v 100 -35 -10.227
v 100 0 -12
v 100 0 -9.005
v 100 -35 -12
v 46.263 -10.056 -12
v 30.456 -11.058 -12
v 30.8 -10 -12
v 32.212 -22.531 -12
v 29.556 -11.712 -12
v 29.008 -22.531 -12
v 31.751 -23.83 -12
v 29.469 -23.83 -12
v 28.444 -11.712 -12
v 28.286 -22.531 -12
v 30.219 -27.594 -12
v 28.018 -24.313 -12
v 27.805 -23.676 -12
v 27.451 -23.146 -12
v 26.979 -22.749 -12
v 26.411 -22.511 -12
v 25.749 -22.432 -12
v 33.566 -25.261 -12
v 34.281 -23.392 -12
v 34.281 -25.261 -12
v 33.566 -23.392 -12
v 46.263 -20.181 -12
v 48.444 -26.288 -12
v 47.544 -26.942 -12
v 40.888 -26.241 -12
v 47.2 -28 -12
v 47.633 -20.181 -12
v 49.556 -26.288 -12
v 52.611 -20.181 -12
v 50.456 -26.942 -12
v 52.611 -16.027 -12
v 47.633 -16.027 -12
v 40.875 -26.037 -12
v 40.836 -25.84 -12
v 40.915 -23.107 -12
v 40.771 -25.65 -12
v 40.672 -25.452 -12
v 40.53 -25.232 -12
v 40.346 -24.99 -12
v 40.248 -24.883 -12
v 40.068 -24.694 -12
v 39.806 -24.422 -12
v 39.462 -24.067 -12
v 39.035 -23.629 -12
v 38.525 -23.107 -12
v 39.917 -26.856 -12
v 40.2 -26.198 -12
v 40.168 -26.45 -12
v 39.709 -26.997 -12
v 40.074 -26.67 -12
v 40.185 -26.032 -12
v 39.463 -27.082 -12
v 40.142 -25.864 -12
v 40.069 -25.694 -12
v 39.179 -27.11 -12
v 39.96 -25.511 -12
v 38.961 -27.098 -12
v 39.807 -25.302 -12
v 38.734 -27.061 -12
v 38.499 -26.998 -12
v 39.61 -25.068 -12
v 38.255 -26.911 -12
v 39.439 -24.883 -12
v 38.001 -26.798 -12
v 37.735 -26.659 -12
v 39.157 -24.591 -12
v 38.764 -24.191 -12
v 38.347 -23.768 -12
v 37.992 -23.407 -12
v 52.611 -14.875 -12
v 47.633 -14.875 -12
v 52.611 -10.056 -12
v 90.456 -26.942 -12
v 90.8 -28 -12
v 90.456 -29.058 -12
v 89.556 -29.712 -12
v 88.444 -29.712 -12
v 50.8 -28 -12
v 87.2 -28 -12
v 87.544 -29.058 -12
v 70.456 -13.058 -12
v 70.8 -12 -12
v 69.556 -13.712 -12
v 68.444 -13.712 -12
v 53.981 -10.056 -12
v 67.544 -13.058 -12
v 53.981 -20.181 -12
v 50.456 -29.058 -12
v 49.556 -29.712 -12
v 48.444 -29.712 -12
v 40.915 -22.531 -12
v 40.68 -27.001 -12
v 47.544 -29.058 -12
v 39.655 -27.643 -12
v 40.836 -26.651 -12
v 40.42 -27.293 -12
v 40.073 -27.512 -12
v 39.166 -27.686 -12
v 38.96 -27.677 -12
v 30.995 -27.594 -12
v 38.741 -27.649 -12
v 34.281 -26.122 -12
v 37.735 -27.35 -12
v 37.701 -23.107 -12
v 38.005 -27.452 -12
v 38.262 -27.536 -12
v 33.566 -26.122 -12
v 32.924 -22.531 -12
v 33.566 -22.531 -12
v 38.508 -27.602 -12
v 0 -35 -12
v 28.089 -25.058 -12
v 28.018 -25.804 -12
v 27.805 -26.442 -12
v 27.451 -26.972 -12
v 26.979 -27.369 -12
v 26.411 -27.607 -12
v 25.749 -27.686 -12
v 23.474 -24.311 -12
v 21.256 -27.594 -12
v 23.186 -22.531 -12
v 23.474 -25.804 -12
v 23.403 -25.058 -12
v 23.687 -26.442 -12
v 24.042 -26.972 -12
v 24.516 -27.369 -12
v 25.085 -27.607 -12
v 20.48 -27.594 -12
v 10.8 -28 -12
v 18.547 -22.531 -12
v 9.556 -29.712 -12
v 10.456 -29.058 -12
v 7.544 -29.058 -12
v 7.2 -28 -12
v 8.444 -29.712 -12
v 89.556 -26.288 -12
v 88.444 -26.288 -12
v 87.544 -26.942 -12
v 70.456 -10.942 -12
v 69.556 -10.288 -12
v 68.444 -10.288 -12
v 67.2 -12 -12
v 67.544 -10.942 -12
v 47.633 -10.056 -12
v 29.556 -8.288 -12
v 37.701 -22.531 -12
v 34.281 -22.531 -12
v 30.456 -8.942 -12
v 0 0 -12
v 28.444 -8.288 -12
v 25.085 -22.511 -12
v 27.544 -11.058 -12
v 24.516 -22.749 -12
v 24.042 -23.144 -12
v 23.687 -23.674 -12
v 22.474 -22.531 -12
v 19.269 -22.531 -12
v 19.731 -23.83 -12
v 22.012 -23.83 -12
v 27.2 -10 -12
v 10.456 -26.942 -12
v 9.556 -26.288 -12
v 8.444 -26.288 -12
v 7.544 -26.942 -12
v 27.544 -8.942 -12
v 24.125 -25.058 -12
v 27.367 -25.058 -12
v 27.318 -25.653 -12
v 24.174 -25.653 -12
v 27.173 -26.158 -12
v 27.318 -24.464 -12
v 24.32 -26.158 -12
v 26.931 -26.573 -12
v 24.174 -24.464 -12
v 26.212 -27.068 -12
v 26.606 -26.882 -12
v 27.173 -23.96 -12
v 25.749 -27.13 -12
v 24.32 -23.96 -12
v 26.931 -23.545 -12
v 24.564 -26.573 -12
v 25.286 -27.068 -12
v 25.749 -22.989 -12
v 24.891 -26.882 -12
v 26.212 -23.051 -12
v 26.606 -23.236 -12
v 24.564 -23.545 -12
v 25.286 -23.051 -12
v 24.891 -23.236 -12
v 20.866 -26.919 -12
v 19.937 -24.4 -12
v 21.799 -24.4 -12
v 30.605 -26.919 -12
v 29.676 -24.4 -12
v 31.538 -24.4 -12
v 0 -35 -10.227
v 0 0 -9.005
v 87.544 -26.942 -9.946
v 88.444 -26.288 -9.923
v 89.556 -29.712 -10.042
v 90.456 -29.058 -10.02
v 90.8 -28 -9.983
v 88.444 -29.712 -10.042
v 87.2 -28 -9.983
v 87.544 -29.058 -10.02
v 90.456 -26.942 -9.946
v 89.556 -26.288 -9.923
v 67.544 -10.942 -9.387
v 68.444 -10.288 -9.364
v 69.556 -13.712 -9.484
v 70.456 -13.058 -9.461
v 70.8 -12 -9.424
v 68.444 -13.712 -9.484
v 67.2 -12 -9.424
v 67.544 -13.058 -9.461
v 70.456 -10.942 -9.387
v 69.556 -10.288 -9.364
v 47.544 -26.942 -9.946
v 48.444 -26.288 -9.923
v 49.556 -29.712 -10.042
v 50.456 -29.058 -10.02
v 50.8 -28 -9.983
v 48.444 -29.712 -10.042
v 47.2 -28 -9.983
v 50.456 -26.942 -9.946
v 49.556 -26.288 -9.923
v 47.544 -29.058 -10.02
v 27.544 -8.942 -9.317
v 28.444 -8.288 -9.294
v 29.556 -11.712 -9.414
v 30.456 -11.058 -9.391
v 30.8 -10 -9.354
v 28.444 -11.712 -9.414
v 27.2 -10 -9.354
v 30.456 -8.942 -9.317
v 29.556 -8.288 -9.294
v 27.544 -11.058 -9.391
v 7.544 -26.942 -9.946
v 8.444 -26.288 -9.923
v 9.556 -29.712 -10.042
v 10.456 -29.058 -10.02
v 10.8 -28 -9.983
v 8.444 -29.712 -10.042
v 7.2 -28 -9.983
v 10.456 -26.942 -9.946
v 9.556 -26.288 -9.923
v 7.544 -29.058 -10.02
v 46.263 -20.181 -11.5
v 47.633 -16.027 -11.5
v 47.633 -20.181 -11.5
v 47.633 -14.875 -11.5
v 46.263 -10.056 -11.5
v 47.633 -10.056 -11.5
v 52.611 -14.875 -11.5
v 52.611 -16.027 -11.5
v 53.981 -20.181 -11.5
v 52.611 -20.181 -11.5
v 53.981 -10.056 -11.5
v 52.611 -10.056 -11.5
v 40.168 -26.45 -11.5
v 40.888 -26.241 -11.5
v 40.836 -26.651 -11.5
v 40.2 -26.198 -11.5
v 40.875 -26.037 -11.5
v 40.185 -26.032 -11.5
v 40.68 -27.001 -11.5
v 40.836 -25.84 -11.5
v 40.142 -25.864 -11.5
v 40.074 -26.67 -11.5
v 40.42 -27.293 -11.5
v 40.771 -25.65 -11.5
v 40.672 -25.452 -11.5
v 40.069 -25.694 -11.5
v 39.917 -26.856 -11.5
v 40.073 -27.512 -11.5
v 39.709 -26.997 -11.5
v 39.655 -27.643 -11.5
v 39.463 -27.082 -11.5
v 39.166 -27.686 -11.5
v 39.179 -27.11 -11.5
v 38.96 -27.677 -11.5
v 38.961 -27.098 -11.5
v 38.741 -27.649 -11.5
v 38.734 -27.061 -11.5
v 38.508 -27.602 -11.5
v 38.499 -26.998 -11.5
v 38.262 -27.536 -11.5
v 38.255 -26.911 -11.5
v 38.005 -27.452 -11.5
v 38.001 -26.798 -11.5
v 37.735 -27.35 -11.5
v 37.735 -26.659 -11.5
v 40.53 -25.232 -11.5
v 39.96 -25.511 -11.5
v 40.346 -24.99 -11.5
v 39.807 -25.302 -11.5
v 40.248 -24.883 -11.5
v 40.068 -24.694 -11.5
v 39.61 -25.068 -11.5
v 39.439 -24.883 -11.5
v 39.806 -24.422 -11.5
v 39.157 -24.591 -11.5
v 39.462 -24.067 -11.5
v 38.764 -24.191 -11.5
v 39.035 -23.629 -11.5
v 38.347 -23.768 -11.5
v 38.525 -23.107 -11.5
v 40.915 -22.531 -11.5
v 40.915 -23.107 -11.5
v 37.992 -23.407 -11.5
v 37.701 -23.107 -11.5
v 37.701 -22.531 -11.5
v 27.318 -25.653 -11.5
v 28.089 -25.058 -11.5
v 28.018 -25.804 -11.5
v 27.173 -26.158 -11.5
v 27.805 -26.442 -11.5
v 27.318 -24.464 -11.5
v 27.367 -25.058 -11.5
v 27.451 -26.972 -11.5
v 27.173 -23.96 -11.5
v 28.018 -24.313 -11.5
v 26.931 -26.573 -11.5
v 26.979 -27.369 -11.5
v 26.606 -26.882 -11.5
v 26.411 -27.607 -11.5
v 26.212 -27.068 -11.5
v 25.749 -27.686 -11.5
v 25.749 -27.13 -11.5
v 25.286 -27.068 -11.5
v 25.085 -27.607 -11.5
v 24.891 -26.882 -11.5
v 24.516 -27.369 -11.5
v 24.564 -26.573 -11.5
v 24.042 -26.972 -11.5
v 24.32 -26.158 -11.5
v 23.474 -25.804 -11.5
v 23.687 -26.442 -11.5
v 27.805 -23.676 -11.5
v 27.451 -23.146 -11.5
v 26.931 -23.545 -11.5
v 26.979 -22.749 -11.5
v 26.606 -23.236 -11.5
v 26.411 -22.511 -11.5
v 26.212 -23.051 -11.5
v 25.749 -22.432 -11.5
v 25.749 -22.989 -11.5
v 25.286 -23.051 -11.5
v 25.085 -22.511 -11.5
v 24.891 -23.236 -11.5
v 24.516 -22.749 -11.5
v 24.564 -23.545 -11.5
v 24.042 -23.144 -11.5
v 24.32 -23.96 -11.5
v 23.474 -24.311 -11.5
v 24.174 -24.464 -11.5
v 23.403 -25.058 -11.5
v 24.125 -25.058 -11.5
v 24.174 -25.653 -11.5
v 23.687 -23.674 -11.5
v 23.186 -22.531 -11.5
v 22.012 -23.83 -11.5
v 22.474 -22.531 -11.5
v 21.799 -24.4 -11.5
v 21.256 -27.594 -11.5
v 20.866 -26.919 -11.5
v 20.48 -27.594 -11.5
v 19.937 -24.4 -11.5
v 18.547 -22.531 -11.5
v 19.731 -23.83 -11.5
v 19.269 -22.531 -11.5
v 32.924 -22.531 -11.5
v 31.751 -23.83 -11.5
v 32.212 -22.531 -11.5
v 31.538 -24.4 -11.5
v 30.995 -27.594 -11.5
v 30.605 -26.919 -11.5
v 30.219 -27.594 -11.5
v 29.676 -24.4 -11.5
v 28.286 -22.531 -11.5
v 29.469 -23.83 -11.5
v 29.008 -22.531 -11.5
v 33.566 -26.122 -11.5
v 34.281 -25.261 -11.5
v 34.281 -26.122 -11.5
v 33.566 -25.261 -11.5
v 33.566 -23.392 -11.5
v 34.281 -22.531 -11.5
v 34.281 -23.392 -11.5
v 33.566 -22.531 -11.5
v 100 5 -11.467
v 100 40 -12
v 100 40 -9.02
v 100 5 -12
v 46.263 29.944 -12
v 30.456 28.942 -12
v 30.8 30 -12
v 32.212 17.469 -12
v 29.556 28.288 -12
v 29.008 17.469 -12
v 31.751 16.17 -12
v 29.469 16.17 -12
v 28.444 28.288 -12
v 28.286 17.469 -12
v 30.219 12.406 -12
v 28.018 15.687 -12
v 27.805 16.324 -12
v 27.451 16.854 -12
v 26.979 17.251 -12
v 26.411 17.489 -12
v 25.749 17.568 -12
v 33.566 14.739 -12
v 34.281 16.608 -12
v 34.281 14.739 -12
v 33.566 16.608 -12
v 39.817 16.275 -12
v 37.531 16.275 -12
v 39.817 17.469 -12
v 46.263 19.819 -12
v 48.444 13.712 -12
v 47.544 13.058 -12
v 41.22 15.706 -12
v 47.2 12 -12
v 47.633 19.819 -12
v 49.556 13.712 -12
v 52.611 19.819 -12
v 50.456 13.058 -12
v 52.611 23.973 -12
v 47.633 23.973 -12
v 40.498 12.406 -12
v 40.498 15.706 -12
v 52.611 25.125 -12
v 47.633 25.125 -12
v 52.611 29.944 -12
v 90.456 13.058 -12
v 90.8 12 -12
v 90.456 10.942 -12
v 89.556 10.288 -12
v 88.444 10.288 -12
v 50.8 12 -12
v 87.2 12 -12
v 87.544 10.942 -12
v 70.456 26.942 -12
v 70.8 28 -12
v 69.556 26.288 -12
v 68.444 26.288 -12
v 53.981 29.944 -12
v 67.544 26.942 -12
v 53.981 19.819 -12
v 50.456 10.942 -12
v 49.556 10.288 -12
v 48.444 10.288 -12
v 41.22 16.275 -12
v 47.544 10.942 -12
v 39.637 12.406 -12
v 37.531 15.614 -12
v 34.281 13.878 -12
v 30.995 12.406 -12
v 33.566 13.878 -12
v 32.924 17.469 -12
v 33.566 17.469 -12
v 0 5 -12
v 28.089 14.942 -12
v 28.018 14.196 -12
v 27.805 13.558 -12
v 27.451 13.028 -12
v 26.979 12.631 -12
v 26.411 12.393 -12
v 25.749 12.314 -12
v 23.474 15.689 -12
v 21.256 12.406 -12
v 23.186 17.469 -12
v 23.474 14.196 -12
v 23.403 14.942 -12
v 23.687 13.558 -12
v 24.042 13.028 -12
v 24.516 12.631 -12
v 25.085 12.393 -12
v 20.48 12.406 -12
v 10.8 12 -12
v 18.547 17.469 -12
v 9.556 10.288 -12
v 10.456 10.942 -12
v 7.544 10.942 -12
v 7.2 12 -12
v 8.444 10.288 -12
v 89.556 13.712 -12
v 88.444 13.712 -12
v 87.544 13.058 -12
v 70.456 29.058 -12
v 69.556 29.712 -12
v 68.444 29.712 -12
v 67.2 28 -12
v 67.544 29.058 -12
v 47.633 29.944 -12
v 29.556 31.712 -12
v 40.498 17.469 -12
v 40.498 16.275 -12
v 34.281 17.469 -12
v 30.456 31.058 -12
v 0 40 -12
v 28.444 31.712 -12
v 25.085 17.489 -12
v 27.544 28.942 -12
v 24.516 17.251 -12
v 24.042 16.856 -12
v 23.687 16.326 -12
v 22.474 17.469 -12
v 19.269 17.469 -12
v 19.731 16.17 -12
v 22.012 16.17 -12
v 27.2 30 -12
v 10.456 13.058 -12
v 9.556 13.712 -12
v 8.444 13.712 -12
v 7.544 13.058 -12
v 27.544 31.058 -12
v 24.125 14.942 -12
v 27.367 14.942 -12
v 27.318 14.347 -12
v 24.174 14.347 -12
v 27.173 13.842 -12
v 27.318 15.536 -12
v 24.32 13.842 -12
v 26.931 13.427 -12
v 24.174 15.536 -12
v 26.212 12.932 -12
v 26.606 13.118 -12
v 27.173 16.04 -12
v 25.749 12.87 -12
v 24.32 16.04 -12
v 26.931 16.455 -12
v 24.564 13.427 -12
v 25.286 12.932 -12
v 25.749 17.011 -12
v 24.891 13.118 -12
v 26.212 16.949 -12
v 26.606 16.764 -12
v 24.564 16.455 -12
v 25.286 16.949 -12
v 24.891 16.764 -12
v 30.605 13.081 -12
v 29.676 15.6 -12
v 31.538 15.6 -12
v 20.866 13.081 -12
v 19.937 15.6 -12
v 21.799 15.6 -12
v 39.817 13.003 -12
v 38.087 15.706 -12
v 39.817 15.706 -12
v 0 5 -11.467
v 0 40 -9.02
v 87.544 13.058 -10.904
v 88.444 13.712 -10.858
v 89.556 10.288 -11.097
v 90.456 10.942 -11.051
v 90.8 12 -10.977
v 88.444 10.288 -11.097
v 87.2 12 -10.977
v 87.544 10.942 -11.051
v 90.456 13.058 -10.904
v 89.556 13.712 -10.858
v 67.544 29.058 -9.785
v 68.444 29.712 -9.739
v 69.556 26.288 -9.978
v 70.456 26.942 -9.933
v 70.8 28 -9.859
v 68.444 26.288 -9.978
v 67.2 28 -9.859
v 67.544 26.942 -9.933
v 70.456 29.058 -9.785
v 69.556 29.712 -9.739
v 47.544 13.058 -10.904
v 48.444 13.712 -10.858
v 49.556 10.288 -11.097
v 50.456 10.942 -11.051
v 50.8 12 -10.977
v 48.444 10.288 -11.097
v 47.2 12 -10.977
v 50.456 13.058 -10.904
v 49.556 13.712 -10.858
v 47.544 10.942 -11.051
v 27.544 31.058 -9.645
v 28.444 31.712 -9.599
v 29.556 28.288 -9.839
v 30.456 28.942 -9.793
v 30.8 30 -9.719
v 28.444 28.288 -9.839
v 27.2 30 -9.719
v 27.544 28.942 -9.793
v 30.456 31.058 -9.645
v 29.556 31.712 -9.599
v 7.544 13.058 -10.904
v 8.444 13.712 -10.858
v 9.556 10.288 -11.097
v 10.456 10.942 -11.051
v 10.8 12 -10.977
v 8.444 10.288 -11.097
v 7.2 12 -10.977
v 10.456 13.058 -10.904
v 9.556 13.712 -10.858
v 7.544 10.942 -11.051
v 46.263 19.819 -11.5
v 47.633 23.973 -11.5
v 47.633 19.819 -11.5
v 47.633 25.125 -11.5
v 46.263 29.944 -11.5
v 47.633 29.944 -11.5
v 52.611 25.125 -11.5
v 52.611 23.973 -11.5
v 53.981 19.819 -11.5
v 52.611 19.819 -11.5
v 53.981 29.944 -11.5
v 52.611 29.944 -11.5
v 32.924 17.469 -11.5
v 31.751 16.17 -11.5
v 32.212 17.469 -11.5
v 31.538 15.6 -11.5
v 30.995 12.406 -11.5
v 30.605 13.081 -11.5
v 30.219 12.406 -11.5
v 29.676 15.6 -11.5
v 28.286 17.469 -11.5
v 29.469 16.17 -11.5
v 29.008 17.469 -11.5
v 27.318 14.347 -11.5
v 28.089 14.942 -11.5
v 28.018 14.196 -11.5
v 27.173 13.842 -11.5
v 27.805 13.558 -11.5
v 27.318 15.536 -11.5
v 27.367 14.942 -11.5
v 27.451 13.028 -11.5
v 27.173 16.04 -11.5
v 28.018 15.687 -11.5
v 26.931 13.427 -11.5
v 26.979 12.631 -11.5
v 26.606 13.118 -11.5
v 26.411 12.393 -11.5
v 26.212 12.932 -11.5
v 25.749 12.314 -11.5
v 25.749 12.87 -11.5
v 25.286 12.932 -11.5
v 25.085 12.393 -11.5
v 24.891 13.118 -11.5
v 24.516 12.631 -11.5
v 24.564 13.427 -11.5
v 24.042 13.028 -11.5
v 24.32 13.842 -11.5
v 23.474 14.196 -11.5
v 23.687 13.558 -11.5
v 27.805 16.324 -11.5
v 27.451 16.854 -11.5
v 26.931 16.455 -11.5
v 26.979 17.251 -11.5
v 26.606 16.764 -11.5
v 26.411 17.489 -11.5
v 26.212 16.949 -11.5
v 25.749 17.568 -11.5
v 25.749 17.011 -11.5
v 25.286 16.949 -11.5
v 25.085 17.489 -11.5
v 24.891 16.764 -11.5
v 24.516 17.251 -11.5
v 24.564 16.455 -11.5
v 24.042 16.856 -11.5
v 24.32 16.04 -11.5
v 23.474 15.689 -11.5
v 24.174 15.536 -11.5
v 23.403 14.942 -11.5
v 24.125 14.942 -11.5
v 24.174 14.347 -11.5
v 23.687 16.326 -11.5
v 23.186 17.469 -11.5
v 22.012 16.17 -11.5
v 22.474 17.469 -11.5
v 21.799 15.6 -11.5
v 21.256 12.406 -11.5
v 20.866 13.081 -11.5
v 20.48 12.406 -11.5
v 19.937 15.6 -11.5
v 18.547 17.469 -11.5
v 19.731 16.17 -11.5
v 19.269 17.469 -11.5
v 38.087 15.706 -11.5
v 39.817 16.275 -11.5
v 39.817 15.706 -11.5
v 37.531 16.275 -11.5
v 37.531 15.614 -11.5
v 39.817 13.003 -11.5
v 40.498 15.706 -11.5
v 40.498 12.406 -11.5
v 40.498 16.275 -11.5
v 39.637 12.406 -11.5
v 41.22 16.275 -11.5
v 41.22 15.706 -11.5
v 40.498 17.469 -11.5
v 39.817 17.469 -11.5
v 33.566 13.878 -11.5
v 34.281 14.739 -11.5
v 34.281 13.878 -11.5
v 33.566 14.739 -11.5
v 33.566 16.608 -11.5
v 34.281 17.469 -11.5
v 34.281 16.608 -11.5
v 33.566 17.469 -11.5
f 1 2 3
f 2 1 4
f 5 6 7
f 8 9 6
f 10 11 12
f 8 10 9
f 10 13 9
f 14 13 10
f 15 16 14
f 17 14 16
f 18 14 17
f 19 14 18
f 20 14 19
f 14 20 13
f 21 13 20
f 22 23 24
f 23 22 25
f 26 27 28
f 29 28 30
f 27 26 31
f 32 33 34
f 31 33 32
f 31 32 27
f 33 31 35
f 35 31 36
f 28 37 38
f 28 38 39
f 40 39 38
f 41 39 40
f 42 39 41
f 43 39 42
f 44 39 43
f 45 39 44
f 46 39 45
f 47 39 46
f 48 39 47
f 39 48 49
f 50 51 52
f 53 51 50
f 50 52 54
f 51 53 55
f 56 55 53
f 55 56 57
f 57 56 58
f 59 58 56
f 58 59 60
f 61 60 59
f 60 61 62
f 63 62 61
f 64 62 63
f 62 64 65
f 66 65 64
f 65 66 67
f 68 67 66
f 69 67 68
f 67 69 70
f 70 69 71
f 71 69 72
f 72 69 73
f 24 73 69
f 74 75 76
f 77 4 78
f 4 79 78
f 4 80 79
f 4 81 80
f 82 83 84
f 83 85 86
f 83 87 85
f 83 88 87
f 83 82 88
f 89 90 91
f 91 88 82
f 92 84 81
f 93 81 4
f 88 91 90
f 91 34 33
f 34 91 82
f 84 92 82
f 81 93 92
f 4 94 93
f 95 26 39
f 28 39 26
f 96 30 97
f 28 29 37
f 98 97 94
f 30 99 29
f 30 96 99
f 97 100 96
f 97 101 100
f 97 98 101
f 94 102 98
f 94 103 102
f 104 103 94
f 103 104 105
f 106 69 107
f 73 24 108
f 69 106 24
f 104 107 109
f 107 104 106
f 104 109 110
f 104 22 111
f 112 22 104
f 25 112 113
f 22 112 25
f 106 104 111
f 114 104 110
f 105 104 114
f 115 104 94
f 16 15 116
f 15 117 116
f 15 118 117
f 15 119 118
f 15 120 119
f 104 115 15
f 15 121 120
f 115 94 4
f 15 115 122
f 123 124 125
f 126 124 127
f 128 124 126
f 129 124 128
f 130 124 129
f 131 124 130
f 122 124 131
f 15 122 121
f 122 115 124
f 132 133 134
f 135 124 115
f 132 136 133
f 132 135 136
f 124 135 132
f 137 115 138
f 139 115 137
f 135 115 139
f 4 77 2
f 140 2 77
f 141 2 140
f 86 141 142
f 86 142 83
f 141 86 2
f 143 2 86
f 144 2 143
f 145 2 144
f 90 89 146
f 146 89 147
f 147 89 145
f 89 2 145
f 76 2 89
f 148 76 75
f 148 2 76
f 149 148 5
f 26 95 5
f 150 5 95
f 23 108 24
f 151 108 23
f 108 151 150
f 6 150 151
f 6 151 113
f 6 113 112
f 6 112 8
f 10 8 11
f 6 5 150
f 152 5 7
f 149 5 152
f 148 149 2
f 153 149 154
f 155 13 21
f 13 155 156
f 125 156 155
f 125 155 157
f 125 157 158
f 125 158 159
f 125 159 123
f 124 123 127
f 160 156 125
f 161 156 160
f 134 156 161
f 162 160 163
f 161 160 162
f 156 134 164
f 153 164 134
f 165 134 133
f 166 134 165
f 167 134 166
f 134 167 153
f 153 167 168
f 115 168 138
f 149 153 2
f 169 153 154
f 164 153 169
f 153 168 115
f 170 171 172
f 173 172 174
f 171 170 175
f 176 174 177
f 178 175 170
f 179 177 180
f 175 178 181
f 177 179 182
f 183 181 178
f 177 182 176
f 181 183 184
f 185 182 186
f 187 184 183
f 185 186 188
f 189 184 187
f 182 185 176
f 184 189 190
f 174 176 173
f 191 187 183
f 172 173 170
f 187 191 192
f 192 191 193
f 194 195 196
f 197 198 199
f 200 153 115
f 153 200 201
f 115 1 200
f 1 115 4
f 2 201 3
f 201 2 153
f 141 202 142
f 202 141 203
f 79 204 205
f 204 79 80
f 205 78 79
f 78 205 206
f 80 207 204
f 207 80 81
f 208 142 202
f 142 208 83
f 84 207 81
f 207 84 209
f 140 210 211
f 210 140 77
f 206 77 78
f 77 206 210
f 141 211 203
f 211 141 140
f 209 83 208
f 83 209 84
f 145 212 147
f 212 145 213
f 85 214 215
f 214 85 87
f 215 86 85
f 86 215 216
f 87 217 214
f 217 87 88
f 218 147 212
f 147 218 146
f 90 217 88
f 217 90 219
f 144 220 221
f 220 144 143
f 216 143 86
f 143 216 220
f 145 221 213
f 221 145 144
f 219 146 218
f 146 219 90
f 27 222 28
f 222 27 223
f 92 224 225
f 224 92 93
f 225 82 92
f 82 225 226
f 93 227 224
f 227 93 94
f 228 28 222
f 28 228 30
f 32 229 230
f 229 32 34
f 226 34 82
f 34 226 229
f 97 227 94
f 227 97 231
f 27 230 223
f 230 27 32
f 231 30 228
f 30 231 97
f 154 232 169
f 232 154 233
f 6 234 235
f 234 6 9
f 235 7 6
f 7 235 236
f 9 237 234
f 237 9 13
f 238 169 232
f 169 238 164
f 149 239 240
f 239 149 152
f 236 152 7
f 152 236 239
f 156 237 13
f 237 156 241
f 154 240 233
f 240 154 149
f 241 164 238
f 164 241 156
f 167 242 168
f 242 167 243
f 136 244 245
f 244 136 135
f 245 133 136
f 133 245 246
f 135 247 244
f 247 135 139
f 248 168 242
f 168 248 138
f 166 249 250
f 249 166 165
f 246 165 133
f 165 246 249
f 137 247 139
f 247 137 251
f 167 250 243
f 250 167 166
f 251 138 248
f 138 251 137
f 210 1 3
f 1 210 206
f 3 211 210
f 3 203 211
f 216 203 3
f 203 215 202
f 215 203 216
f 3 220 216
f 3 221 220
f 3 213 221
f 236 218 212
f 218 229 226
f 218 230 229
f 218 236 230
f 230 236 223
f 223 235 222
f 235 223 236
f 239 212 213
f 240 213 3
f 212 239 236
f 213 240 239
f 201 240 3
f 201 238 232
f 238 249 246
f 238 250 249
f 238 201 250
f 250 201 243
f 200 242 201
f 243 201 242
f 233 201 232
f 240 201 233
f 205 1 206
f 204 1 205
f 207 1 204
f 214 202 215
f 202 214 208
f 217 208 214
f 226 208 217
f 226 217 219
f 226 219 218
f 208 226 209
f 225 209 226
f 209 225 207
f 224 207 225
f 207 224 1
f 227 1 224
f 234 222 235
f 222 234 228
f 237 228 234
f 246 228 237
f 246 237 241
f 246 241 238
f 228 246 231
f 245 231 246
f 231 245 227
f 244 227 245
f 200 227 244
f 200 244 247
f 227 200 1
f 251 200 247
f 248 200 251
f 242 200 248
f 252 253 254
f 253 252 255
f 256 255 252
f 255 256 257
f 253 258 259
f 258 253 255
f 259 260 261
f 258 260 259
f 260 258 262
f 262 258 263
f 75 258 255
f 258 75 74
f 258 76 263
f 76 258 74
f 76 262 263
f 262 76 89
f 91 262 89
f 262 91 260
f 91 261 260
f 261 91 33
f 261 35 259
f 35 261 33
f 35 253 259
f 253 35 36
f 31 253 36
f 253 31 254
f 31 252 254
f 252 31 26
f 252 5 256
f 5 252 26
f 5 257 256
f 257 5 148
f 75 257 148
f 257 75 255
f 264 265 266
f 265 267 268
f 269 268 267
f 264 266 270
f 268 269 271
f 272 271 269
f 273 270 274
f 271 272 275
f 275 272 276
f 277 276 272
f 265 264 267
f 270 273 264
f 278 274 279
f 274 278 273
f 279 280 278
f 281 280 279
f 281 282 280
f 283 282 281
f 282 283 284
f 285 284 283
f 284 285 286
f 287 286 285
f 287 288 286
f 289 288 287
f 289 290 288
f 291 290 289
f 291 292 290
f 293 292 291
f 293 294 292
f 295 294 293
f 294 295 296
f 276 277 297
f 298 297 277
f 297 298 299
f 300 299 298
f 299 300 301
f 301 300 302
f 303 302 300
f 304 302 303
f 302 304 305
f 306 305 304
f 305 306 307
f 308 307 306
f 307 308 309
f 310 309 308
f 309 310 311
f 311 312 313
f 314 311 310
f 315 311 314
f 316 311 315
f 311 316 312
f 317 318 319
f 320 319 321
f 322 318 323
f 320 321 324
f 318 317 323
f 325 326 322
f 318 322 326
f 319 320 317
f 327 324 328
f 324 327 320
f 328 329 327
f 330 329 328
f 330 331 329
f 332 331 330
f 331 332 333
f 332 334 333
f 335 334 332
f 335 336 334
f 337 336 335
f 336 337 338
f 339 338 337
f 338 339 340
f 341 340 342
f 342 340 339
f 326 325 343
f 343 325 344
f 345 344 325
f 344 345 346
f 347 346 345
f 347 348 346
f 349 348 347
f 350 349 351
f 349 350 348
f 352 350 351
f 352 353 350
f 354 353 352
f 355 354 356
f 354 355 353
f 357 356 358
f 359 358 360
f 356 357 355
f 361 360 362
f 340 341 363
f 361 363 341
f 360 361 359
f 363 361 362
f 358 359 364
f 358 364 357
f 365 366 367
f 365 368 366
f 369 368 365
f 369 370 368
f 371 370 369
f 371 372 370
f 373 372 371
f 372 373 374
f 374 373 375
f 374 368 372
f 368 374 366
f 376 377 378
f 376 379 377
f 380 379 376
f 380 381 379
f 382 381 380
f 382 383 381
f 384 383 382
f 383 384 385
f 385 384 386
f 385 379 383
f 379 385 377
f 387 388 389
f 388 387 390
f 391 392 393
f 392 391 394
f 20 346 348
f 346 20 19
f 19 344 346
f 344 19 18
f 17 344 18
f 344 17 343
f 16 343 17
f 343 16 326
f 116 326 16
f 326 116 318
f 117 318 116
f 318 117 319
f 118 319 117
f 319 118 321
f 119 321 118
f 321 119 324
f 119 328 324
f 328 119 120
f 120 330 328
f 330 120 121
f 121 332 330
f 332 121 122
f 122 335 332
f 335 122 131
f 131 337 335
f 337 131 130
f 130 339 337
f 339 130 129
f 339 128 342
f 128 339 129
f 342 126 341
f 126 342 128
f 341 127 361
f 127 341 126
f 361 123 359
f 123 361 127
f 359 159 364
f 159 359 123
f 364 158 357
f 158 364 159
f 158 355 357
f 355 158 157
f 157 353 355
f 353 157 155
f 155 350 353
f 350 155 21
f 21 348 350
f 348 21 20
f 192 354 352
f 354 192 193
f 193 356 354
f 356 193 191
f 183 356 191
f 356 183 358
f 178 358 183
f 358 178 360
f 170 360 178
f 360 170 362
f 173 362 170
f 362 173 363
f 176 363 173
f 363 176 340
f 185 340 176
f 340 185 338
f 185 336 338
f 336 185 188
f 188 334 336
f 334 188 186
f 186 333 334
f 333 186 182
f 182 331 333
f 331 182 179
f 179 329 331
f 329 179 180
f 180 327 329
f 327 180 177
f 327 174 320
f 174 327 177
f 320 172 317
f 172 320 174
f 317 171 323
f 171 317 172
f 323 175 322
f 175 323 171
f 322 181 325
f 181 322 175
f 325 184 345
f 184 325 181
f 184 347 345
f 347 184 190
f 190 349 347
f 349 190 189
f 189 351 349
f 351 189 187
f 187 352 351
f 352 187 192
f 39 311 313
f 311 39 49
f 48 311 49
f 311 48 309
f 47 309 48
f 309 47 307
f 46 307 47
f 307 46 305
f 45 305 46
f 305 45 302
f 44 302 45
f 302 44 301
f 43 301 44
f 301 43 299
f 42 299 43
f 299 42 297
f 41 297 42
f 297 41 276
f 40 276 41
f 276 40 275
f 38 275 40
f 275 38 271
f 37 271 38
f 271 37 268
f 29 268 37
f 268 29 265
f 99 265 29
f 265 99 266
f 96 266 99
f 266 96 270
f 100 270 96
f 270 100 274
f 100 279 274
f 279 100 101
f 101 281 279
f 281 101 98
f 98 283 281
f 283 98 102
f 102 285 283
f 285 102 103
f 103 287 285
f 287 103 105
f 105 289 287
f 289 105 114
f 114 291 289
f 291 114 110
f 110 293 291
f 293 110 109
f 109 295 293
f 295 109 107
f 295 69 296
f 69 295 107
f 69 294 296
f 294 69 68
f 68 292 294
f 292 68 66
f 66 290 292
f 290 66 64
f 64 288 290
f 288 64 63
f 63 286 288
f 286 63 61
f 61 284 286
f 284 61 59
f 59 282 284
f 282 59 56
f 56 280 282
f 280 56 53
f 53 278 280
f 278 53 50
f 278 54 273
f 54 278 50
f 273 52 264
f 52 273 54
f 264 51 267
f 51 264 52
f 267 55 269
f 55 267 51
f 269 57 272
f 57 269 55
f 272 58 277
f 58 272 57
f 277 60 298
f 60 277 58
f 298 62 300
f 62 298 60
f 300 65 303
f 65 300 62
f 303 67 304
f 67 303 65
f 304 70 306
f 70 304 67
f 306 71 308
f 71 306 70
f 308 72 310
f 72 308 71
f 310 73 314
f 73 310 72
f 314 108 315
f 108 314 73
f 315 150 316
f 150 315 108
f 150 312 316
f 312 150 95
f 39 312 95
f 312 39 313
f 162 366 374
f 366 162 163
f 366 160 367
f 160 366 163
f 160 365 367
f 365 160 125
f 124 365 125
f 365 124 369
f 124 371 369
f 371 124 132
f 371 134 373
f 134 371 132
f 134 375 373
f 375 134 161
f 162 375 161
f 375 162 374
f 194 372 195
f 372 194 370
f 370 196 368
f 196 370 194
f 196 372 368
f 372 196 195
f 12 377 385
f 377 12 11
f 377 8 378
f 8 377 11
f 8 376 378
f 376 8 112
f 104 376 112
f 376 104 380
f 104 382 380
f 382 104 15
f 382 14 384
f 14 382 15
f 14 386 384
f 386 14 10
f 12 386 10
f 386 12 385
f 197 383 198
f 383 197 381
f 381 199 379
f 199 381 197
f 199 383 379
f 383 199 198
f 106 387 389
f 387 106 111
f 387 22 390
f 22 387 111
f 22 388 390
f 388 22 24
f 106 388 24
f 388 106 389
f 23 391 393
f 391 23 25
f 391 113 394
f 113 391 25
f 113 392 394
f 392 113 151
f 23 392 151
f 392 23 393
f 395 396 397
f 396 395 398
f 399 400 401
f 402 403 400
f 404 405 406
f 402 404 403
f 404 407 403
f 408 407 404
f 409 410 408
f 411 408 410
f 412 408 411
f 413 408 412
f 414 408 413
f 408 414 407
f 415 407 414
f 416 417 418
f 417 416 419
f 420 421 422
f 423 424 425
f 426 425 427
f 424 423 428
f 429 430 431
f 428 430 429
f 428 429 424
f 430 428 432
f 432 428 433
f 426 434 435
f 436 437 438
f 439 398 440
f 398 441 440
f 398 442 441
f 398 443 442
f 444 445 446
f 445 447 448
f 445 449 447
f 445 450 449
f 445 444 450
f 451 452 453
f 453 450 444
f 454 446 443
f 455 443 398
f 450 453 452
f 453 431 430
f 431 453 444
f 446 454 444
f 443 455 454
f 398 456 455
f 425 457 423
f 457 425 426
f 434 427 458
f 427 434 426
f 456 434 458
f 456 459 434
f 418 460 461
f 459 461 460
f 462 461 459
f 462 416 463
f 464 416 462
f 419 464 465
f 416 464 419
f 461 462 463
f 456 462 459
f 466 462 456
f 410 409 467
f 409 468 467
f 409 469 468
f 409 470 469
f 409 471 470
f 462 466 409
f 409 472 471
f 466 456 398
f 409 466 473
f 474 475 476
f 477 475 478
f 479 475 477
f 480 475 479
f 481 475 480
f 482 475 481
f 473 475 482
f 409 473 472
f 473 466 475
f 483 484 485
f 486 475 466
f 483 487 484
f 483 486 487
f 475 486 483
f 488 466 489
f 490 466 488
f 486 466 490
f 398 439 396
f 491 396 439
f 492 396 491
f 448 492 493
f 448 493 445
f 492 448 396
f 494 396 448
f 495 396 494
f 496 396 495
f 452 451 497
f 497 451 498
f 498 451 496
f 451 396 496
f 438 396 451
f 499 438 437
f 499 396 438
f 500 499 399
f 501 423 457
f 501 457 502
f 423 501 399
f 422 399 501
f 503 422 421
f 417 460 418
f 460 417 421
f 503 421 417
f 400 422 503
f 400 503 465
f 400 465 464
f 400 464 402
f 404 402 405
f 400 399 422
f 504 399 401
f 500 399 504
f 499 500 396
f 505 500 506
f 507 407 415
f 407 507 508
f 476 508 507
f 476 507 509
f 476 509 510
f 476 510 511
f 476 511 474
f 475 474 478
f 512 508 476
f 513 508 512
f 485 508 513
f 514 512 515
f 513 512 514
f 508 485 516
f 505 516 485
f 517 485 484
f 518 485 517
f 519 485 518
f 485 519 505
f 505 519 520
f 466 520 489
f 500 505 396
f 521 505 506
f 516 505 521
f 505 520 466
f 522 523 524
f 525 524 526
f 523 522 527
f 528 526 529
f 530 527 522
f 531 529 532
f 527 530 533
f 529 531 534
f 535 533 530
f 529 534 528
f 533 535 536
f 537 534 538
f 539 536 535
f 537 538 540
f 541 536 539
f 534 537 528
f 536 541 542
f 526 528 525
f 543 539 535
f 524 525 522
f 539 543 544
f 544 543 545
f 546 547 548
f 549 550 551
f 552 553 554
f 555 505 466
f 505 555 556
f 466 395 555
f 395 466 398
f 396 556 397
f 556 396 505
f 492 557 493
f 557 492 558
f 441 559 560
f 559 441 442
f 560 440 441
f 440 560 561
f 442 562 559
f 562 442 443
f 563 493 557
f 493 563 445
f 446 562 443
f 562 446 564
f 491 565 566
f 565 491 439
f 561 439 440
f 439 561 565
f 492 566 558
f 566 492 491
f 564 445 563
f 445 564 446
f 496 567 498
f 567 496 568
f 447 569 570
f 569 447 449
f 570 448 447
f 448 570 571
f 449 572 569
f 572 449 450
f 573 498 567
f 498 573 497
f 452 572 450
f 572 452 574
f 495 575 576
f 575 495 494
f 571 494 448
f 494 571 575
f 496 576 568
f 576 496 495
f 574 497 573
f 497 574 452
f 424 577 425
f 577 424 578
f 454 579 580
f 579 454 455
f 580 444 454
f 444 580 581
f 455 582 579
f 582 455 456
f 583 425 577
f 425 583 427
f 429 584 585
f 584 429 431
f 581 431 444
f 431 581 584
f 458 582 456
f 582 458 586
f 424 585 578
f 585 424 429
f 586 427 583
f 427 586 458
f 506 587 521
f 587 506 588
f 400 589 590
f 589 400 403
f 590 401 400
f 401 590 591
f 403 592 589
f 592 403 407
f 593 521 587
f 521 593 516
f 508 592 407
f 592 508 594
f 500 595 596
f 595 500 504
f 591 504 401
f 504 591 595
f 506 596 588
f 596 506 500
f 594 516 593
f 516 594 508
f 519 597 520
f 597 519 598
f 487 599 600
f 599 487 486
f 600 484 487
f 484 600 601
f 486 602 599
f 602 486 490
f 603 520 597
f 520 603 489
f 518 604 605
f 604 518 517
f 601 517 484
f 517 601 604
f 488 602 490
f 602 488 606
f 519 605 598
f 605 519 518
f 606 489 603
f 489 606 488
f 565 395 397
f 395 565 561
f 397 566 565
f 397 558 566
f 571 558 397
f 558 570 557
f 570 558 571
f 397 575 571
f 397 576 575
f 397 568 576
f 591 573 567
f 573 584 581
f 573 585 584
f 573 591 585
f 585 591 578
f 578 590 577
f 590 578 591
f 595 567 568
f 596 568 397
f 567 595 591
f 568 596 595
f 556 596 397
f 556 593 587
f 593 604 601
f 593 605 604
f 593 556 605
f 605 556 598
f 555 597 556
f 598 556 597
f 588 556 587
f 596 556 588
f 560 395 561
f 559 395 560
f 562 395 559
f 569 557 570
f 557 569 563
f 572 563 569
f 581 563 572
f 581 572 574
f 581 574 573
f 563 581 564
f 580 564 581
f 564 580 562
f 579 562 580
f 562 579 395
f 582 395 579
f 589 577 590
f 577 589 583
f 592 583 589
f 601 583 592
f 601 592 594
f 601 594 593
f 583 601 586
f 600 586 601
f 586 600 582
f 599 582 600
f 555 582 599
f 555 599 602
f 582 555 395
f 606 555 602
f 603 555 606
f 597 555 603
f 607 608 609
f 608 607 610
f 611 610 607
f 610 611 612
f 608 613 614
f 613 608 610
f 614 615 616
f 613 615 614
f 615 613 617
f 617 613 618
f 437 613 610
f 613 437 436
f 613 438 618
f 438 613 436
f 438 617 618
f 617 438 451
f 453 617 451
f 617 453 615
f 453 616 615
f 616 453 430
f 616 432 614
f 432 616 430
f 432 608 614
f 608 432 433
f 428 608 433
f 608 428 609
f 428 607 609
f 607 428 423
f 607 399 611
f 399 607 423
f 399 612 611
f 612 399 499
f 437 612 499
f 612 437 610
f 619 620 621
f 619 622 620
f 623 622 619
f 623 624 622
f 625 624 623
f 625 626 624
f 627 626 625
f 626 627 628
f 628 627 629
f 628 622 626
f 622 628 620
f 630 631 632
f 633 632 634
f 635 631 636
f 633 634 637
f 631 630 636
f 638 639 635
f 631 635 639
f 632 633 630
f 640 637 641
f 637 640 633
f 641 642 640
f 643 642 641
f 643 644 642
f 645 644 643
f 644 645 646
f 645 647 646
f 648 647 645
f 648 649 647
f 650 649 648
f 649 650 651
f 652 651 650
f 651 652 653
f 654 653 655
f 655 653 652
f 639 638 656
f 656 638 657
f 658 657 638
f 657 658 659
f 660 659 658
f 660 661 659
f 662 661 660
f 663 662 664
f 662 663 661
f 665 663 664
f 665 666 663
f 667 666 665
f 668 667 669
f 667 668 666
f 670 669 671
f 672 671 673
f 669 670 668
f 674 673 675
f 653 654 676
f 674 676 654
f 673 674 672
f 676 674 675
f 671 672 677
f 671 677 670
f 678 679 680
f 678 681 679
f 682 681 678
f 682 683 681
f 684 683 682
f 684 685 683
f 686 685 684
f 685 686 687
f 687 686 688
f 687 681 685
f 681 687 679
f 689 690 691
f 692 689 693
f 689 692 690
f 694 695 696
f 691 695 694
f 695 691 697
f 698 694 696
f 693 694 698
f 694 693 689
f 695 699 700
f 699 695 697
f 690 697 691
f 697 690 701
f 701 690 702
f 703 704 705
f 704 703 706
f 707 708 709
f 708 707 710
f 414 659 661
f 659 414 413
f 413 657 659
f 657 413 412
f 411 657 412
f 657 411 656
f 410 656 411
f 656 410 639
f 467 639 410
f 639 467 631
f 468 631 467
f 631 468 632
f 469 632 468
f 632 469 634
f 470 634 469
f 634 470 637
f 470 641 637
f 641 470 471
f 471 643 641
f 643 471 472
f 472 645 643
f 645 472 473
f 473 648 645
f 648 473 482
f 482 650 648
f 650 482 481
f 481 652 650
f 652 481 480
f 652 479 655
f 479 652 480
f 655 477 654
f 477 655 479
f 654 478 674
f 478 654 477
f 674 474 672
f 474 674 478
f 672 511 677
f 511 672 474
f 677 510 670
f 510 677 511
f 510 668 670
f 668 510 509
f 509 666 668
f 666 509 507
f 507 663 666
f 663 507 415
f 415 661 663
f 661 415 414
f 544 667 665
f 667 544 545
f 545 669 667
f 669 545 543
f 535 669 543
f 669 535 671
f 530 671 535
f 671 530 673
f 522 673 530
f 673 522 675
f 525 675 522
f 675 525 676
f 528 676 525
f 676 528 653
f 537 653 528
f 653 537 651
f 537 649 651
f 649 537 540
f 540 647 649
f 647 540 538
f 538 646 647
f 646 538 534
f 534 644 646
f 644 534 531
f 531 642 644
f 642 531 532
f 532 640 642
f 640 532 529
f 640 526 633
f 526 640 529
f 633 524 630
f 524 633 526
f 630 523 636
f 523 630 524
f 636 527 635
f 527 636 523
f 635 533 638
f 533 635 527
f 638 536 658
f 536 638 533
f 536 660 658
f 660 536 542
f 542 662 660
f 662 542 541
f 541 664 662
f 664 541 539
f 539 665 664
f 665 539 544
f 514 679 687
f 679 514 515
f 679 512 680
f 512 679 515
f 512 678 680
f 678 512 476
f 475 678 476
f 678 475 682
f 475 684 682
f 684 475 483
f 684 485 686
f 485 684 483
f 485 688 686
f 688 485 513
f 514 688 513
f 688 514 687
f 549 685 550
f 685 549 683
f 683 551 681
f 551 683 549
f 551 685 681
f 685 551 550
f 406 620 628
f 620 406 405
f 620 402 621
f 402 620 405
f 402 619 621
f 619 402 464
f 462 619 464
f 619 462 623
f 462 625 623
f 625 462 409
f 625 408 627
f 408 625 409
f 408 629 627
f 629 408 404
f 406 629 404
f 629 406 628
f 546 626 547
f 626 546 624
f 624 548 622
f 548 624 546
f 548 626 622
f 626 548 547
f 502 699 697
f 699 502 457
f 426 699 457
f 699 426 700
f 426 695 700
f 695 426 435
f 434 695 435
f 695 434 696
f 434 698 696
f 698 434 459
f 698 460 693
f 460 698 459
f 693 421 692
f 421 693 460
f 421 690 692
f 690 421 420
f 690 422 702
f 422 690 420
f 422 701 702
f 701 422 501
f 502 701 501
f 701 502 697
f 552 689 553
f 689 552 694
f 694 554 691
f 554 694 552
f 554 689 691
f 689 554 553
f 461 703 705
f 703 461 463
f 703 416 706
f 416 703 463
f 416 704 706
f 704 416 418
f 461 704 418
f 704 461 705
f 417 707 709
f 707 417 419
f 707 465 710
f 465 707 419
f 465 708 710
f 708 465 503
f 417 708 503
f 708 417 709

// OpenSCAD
// file: ../lib/naca4.scad
// Naca4.scad - library for parametric airfoils of 4 digit NACA series
// Code: Rudolf Huttary, Berlin 
// June 2015
// commercial use prohibited


// general use: for more examples refer to sampler.scad
// naca = naca digits or 3el vector  (default = 12 or [0, 0, .12])
// L    = chord length [mm]      (default= 100)
// N    = # sample points        (default= 81)
// h    = height [mm]            (default= 1)
// open = close at the thin end? (default = true)
// two equivalent example calls
 airfoil(naca = 2408, L = 60, N=1001, h = 30, open = false); 
// airfoil(naca = [.2, .4, .32], L = 60, N=1001, h = 30, open = false); 

module help()
{
  echo(str("\n\nList of signatures in lib:\n=================\n", 
  "module airfoil(naca=2412, L = 100, N = 81, h = 1, open = false) - renders airfoil object\n", 
  "module airfoil(naca=[.2, .4, .12], L = 100, N = 81, h = 1, open = false) - renders airfoil object using percentage for camber,  camber distance and thicknes\n", 
  "function airfoil_data(naca=12, L = 100, N = 81, open = false)\n",
  "=================\n")); 
}

help(); 
// this is the object
module airfoil(naca=12, L = 100, N = 81, h = 1, open = false)
{
  linear_extrude(height = h)
  polygon(points = airfoil_data(naca, L, N, open)); 
}

module hollow_airfoil(lnaca=12, L = 100, N = 81, h = 1, open = false, wall_thickness = 1)
{
    if (open){
        linear_extrude(height = h)

        if (wall_thickness>0){
            difference(){
                polygon(points = airfoil_data(naca, L, N, false));
                offset(delta = - wall_thickness, chamfer = false) polygon(points = airfoil_data(naca, L, N, open = false));
            }
        }
        else{
            difference(){
                offset(delta = - wall_thickness, chamfer = false) polygon(points = airfoil_data(naca, L, N, open = false));
                polygon(points = airfoil_data(naca, L, N, false));
            }
        }
    }
    else{

        linear_extrude(height = abs(wall_thickness))
            polygon(points = airfoil_data(naca, L, N, false)); 

        linear_extrude(height = h)
            difference(){
                polygon(points = airfoil_data(naca, L, N, open));
                offset(delta = - wall_thickness) polygon(points = airfoil_data(naca, L, N, open = false));
            }

        translate([0,0, h - wall_thickness])
            linear_extrude(height = abs(wall_thickness))
                polygon(points = airfoil_data(naca, L, N, false)); 

    }
}


// this is the main function providing the airfoil data
function airfoil_data(naca=12, L = 100, N = 81, open = false) = 
  let(Na = len(naca)!=3?NACA(naca):naca)
  let(A = [.2969, -0.126, -.3516, .2843, open?-0.1015:-0.1036])
  [for (b=[-180:360/(N):179.99]) 
    let (x = (1-cos(b))/2)  
    let(yt = sign(b)*Na[2]/.2*(A*[sqrt(x), x, x*x, x*x*x, x*x*x*x])) 
    Na[0]==0?L*[x, yt]:L*camber(x, yt, Na[0], Na[1], sign(b))];  


function trailing_edge_angle(naca=12, open = false) = 
  let(Na = len(naca)!=3?NACA(naca):naca)
  let(A = [.2969, -0.126, -.3516, .2843, open?-0.1015:-0.1036])
  let (x =0.999)  // set x near to airfoil trailing edge
  let(yt = Na[2]/.2*(A*[sqrt(x), x, x*x, x*x*x, x*x*x*x])) // calculate distance from x-axis at previously set position
  atan2(yt,1-x);  // calculate angle of triangle between end of airfoil. The triange height corresponds to previously calculated distance from x-axis

function surface_angle(x = 0.5, naca=12, open = false) = 
  let(Na = len(naca)!=3?NACA(naca):naca)
  let(A = [0.2969, -0.126, -0.3516, 0.2843, open?-0.1015:-0.1036])
  let(dy = Na[2]/0.2*(A*[(1/2)*(1/sqrt(x)), 1, 2*x, 3*x*x, 4*x*x*x])) // calculate derivative of airfoil function at the x point
  atan(dy);  // calculate  the angle from function derivative

function surface_distance(x = 0.5, naca=12, open = false) = 
  let(Na = len(naca)!=3?NACA(naca):naca)
  let(A = [0.2969, -0.126, -0.3516, 0.2843, open?-0.1015:-0.1036])
  Na[2]/.2*(A*[sqrt(x), x, x*x, x*x*x, x*x*x*x]); // calculate distance from x-axis at previously set position

// helper functions
function NACA(naca) = 
  let (M = floor(naca/1000))
  let (P = floor((naca-M*1000)/100)) 
  [M/100, P/10, floor(naca-M*1000-P*100)/100];  

function camber(x, y, M, P, upper) = 
  let(yc = (x<P)?M/P/P*(2*P*x-x*x): M/(1-P)/(1-P)*(1 - 2*P + 2*P*x -x*x))
  let(dy = (x<P)?2*M/P/P*(P-x):2*M/(1-P)/(1-P)*(P-x))
  let(th = atan(dy))
  [upper ? x - y*sin(th):x + y*sin(th), upper ? yc + y*cos(th):yc - y*cos(th)];
// file: ../666_1247.scad
use <./lib/naca4.scad>
include <../Parameters.scad>

AOA = 2.0; // set Angle of Attact of the airfoil

module 666_1247(angle_of_attact){
	union(){
		difference(){
			cube([100,35,12]);

			translate([9+ 20 + 20 + 20 + 20,35-7,-1])
					cylinder (h = 20, r = 3.6/2, $fn = 10);

			translate([9 + 20 + 20 + 20, 35-23, -1])	
					cylinder (h = 20, r = 3.6/2, $fn = 10);

			translate([9 + 20 + 20,35-7,-1])	
					cylinder (h = 20, r = 3.6/2, $fn = 10);

			translate([9 + 20, 35-25, -1])	
					cylinder (h = 20, r = 3.6/2, $fn = 10);

			translate([9,35-7,-1])	
					cylinder (h = 20, r = 3.6/2, $fn = 10);

			translate([-1,0,(12-8)/4])		// set AOA
				rotate([angle_of_attact,0,0])		
					cube([200, 100, 8]);

            translate([50, 15, 11.5])
                            linear_extrude(0.5) 
                                text("H", size = 10, halign = "center", valign = "center", font = "PT Sans");

            translate([30, 25, 11.5])
                            linear_extrude(0.5) 
                                text( str("AOA: ", angle_of_attact), size = 5, halign = "center", valign = "center", font = "PT Sans");

            translate([50, 15, 0])
                            linear_extrude(0.5) 
                                text("D", size = 10, halign = "center", valign = "center", font = "PT Sans");

            translate([30, 25, 0])
                            linear_extrude(0.5) 
                                text(str("AOA: ", angle_of_attact), size = 5, halign = "center", valign = "center", font = "PT Sans");


		}
	}
}

module 666_1247_H(angle_of_attact){
    intersection(){
        translate([-1,0,5])      
            cube([200, 100, 20]);
        666_1247(angle_of_attact);

    }
}

module 666_1247_D(angle_of_attact){
    intersection(){
        translate([-1,0,0])      
            cube([200, 100, 5]);
        666_1247(angle_of_attact);

    }
}


666_1247_H(AOA);

666_1247_D(AOA);
// file: ../../Parameters.scad
//Main tube diameter - hole [mm]
main_tube_outer_diameter = 25.4;
main_tube_inner_diameter = 23.5;

//Tube for undercarriage - hole [mm]
tube_for_undercarriage_outer_diameter = 10.6;
tube_for_undercarriage_inner_diameter = 6;
global_clearance = 0.5;




// Parameters of tube couplings
coupling_wall_thickness = main_tube_outer_diameter/5;  //width of coupling walls 
thickness_between_tubes = main_tube_outer_diameter/10;    // minimum distance between tubes in couplings

coupling_wall_thickness_undercarriage = tube_for_undercarriage_outer_diameter/3;
thickness_between_tubes_undercarriage = tube_for_undercarriage_outer_diameter/10;

// screw lenght step - minimum difference in lenght between two types of screws
basic_screw_length = 5;


//Screw diameter and nut for M6 [mm]
M6_screw_diameter=6.5;
Nut_height_M6 = 4.9;
Nut_diameter_M6 = 11.8;


//Screw diameter and nut for M4 [mm]
M4_screw_diameter=4.5;
Nut_height_M4 = 3.2;
Nut_diameter_M4 = 8.4;
Screw_head_height_M4 = 4;

//Screw diameter and nut for M3 [mm]
M3_screw_diameter = 3.2;
Nut_height_M3 = 2.7;	
Nut_diameter_M3 = 6.6; 
Screw_head_height_M3 = 3;


//šroub servo
Servo_screw = 1.5;

//The tube for help
Help_main_tube_outer = 25;
Help_main_tube_inner = 23; 
Help_tube_for_undercarriage_outer = 10;
Help_tube_for_undercarriage_inner = 5;


//main hull parameters

hull_drop_length = 580;
hull_wall_thickness = 0.8;
hull_y_size = 120;
hull_z_size = 150;
hull_x_size = 580;
hull_corner_radius = 4;
hull_airfoil_thickness= 35;  // thickness of drop generating airfoil in percent of lenght.
hull_scale_x = 1;
hull_scale_y = 1.5;
hull_scale_z = 1.5;

main_pilon_position = 170+68;       // pozice rotorového pilonu měřená od přední části krytu
cover_pilon_position = 180;
height_of_vertical_tube = 275; //278mm je změřená délka trubky. 

//délka hlavní dlouhé trubky
length_of_main_tube = 920;
length_of_undercarriage_tube = 300;

ribbon_width = 5; // šířka vyztužovacích lemů. 

// šířka otvoru v přední části kapoty pro držák motoru.
width_of_engine_holder = 63;

//Top Cover Division - dělení horního krytu pro tisk
top_cover_division = [0, 50, 150, 280, 410, hull_x_size]; // upraveny seznam tak, aby deleni začinalo od nuly, což umožňí úplně automatické rozdělení.

//Bottom Cover Division - dělení dolního krytu pro tisk
bottom_cover_division = [0,100,232.5,365, 470, hull_x_size];
// zkrácená část pro payload pro testovací tisk
//bottom_cover_division = [0,200,250,365, 470, hull_x_size];





//Cover pilon division - na výšku (v ose Z)
cover_pilon_division = [0,170,height_of_vertical_tube + main_tube_outer_diameter + coupling_wall_thickness];

//pozice šroubů
	//horní kryt
top_screw_position = [0,
                    (top_cover_division[0] + top_cover_division[1])/2,
                    (top_cover_division[2] - top_cover_division[1])/2 + top_cover_division[1],
                    (top_cover_division[3] - top_cover_division[2])/2 + top_cover_division[2],
                    (top_cover_division[4] - top_cover_division[3])/8 + top_cover_division[3],
                    (top_cover_division[5] - top_cover_division[4])/2 + top_cover_division[4] - top_cover_division[1]/3];
	//spodní kryt
bottom_screw_position = [0,
                        (bottom_cover_division[0] + bottom_cover_division[1])*(2/6), 
                        bottom_cover_division[1]*(9/10), 
                        bottom_cover_division[3] + bottom_cover_division[1]*(1/10), 
                        bottom_cover_division[3] + bottom_cover_division[1]*(3/5)];




//šířka zámků
lock_width = 10;

//délka zámků
lock_length = 3;


//accumulator
//základní rozměry akumulátoru
width_of_accumulator = 129.4;//45+1;
depth_of_accumulator = 40.61;
height_of_accumulator = 43.65;
//Zapuštění akumulátoru
sink_of_accumulator = 5; //main_tube_outer_diameter/5 - Nut_height_M3*1.5;

//tloušťka hrany spojky
accumulator_holder_width = 18; 
accumulator_holder_thickness = 10; 

//posunutí akumálátoru na podložce
move_of_accumulator = 75;   // pozice akumulátoru (ovlivňuje těžiště)


////////////////
// Senzory
///////////////////

//opticalFlow
width_optical_flow_senzor = 45.5;
depth_optical_flow_senzor = 6;
height_optical_flow_senzor = 35;
sink_of_optical_flow_senzor = depth_optical_flow_senzor - 5; 
M3_optical_flow_senzor_Z = 30.4;
M3_optical_flow_senzor_X = 24;
M3_optical_flow_senzor_Z_alone = 9.1;
M3_optical_flow_senzor_X_alone = 16.7;

//GPS anténa
GPS_outer_length = 48.01;   //Vnější rozměr
GPS_inner_length = 37.48;   //Vnitřní rozměr
GPS_diameter = (GPS_outer_length - GPS_inner_length)/2;    //Průměr otvoru
GPS_middle_length = GPS_diameter + GPS_inner_length;      //Střední rozměr


////podzvozek

radius_undercarriage = 25;
vzdalenost_x = tan(20) * 131;
vzdalenost_y = (131 - radius_undercarriage)/tan(79);
uhel_y = 90 - 20;
uhel_x = 90 - 79;

maximum_printable_size = 150;


////Pitotova trubice
Pitot_tube_diameter = 4.02 + 1;
Distance_hole_from_tube = 11.92;  //vzdálenost otvoru pro připevnění od samotné trubičky


////směrové kormidlo
Rudder_length = 4*main_tube_outer_diameter;
Rudder_height = 2*main_tube_outer_diameter;
Rudder_depth = main_tube_outer_diameter/2;
gap_width = 2*hull_wall_thickness;      //šířka mezery mezi směrovkou a ocasní plochou
ruder_shaft_diameter = 2.6; //otočné uchycení směrovky - průměr 2 mm


/////spojka 666_1004

    width_666_1004 = (main_tube_outer_diameter+2*coupling_wall_thickness - Screw_head_height_M3)/basic_screw_length;
        echo("width_666_1004 is", width_666_1004);
    
        echo("ceil_666_1004 is", ceil(width_666_1004));

    coupling_screw_length_666_1004 = (ceil(width_666_1004)) * basic_screw_length;
        echo("coupling_screw_length_666_1004 is", coupling_screw_length_666_1004);

    coupling_width_666_1004 = coupling_screw_length_666_1004 + Screw_head_height_M3;
        echo("coupling_width_666_1004 is", coupling_width_666_1004);

    height_666_1004 = coupling_width_666_1004;
        echo("height_666_1004 is", height_666_1004);

/////spojka 666_1026



    width_666_1026 = main_tube_outer_diameter + 2*thickness_between_tubes;
    
    depth_666_1026 = (main_tube_outer_diameter*2)/basic_screw_length;
        echo("depth_666_1026 is", depth_666_1026);
    
        echo("ceil_666_1026 is", ceil(depth_666_1026));

    coupling_screw_length_666_1026 = (ceil(depth_666_1026)) * basic_screw_length;
        echo("coupling_screw_length_666_1026 is", coupling_screw_length_666_1026);


thickness_of_plate = coupling_screw_length_666_1026 - Screw_head_height_M4 - 50; //50 mm je konstatní šířka spojky 666_1026
    echo("thickness_of_plate is", thickness_of_plate);

        coupling_depth_666_1026 = coupling_screw_length_666_1026 - Screw_head_height_M4 - thickness_of_plate;      //zde je odečten screw_head_height_M4 pro určení šířky, tak aby šroub přesahoval pro potřebnou matku
            echo("coupling_depth_666_1026 is", coupling_depth_666_1026);

    height_666_1026 = coupling_depth_666_1026;
        echo("height_666_1026 is", height_666_1026);

//tloušťka plechu pro zajištění konstatní šířky spojky 50 mm



////spojka 666_1017

    width_666_1017 = (main_tube_outer_diameter + 4*coupling_wall_thickness - Screw_head_height_M3)/basic_screw_length;
        echo("width_666_1017 is", width_666_1017);
    
        echo("ceil_666_1017 is", ceil(width_666_1017));

    coupling_screw_length_666_1017 = (ceil(width_666_1017)) * basic_screw_length;
        echo("coupling_screw_length_666_1017 is", coupling_screw_length_666_1017);

    coupling_width_666_1017 = coupling_screw_length_666_1017 + Screw_head_height_M3;
        echo("coupling_width_666_1017 is", coupling_width_666_1017);

    depth_666_1017 = coupling_width_666_1017;

    height_666_1017= 70; //main_tube_outer_diameter*1.8+main_tube_outer_diameter+wall_thickness;






//umístění podvozkových trubek

second_undercarriage_hole = main_tube_outer_diameter*2 + 2*coupling_wall_thickness + main_tube_outer_diameter + 170 + 160;


//Base Divison - dělení podložky
base_division = [0, 140, main_pilon_position - (3*main_tube_outer_diameter)/2 + 3 * main_tube_outer_diameter, second_undercarriage_hole - coupling_width_666_1004/2, hull_x_size];

// šrouby pro připevnění podložky k hlavní trubce
base_mounting_screw_length = 50;
// main file
include <../../Parameters.scad>
use <../666_1247.scad>

rotate([180,0,0])
    666_1247_H(2);

translate([0,40,0])
    rotate([180,0,0])
        666_1247_H(4);
